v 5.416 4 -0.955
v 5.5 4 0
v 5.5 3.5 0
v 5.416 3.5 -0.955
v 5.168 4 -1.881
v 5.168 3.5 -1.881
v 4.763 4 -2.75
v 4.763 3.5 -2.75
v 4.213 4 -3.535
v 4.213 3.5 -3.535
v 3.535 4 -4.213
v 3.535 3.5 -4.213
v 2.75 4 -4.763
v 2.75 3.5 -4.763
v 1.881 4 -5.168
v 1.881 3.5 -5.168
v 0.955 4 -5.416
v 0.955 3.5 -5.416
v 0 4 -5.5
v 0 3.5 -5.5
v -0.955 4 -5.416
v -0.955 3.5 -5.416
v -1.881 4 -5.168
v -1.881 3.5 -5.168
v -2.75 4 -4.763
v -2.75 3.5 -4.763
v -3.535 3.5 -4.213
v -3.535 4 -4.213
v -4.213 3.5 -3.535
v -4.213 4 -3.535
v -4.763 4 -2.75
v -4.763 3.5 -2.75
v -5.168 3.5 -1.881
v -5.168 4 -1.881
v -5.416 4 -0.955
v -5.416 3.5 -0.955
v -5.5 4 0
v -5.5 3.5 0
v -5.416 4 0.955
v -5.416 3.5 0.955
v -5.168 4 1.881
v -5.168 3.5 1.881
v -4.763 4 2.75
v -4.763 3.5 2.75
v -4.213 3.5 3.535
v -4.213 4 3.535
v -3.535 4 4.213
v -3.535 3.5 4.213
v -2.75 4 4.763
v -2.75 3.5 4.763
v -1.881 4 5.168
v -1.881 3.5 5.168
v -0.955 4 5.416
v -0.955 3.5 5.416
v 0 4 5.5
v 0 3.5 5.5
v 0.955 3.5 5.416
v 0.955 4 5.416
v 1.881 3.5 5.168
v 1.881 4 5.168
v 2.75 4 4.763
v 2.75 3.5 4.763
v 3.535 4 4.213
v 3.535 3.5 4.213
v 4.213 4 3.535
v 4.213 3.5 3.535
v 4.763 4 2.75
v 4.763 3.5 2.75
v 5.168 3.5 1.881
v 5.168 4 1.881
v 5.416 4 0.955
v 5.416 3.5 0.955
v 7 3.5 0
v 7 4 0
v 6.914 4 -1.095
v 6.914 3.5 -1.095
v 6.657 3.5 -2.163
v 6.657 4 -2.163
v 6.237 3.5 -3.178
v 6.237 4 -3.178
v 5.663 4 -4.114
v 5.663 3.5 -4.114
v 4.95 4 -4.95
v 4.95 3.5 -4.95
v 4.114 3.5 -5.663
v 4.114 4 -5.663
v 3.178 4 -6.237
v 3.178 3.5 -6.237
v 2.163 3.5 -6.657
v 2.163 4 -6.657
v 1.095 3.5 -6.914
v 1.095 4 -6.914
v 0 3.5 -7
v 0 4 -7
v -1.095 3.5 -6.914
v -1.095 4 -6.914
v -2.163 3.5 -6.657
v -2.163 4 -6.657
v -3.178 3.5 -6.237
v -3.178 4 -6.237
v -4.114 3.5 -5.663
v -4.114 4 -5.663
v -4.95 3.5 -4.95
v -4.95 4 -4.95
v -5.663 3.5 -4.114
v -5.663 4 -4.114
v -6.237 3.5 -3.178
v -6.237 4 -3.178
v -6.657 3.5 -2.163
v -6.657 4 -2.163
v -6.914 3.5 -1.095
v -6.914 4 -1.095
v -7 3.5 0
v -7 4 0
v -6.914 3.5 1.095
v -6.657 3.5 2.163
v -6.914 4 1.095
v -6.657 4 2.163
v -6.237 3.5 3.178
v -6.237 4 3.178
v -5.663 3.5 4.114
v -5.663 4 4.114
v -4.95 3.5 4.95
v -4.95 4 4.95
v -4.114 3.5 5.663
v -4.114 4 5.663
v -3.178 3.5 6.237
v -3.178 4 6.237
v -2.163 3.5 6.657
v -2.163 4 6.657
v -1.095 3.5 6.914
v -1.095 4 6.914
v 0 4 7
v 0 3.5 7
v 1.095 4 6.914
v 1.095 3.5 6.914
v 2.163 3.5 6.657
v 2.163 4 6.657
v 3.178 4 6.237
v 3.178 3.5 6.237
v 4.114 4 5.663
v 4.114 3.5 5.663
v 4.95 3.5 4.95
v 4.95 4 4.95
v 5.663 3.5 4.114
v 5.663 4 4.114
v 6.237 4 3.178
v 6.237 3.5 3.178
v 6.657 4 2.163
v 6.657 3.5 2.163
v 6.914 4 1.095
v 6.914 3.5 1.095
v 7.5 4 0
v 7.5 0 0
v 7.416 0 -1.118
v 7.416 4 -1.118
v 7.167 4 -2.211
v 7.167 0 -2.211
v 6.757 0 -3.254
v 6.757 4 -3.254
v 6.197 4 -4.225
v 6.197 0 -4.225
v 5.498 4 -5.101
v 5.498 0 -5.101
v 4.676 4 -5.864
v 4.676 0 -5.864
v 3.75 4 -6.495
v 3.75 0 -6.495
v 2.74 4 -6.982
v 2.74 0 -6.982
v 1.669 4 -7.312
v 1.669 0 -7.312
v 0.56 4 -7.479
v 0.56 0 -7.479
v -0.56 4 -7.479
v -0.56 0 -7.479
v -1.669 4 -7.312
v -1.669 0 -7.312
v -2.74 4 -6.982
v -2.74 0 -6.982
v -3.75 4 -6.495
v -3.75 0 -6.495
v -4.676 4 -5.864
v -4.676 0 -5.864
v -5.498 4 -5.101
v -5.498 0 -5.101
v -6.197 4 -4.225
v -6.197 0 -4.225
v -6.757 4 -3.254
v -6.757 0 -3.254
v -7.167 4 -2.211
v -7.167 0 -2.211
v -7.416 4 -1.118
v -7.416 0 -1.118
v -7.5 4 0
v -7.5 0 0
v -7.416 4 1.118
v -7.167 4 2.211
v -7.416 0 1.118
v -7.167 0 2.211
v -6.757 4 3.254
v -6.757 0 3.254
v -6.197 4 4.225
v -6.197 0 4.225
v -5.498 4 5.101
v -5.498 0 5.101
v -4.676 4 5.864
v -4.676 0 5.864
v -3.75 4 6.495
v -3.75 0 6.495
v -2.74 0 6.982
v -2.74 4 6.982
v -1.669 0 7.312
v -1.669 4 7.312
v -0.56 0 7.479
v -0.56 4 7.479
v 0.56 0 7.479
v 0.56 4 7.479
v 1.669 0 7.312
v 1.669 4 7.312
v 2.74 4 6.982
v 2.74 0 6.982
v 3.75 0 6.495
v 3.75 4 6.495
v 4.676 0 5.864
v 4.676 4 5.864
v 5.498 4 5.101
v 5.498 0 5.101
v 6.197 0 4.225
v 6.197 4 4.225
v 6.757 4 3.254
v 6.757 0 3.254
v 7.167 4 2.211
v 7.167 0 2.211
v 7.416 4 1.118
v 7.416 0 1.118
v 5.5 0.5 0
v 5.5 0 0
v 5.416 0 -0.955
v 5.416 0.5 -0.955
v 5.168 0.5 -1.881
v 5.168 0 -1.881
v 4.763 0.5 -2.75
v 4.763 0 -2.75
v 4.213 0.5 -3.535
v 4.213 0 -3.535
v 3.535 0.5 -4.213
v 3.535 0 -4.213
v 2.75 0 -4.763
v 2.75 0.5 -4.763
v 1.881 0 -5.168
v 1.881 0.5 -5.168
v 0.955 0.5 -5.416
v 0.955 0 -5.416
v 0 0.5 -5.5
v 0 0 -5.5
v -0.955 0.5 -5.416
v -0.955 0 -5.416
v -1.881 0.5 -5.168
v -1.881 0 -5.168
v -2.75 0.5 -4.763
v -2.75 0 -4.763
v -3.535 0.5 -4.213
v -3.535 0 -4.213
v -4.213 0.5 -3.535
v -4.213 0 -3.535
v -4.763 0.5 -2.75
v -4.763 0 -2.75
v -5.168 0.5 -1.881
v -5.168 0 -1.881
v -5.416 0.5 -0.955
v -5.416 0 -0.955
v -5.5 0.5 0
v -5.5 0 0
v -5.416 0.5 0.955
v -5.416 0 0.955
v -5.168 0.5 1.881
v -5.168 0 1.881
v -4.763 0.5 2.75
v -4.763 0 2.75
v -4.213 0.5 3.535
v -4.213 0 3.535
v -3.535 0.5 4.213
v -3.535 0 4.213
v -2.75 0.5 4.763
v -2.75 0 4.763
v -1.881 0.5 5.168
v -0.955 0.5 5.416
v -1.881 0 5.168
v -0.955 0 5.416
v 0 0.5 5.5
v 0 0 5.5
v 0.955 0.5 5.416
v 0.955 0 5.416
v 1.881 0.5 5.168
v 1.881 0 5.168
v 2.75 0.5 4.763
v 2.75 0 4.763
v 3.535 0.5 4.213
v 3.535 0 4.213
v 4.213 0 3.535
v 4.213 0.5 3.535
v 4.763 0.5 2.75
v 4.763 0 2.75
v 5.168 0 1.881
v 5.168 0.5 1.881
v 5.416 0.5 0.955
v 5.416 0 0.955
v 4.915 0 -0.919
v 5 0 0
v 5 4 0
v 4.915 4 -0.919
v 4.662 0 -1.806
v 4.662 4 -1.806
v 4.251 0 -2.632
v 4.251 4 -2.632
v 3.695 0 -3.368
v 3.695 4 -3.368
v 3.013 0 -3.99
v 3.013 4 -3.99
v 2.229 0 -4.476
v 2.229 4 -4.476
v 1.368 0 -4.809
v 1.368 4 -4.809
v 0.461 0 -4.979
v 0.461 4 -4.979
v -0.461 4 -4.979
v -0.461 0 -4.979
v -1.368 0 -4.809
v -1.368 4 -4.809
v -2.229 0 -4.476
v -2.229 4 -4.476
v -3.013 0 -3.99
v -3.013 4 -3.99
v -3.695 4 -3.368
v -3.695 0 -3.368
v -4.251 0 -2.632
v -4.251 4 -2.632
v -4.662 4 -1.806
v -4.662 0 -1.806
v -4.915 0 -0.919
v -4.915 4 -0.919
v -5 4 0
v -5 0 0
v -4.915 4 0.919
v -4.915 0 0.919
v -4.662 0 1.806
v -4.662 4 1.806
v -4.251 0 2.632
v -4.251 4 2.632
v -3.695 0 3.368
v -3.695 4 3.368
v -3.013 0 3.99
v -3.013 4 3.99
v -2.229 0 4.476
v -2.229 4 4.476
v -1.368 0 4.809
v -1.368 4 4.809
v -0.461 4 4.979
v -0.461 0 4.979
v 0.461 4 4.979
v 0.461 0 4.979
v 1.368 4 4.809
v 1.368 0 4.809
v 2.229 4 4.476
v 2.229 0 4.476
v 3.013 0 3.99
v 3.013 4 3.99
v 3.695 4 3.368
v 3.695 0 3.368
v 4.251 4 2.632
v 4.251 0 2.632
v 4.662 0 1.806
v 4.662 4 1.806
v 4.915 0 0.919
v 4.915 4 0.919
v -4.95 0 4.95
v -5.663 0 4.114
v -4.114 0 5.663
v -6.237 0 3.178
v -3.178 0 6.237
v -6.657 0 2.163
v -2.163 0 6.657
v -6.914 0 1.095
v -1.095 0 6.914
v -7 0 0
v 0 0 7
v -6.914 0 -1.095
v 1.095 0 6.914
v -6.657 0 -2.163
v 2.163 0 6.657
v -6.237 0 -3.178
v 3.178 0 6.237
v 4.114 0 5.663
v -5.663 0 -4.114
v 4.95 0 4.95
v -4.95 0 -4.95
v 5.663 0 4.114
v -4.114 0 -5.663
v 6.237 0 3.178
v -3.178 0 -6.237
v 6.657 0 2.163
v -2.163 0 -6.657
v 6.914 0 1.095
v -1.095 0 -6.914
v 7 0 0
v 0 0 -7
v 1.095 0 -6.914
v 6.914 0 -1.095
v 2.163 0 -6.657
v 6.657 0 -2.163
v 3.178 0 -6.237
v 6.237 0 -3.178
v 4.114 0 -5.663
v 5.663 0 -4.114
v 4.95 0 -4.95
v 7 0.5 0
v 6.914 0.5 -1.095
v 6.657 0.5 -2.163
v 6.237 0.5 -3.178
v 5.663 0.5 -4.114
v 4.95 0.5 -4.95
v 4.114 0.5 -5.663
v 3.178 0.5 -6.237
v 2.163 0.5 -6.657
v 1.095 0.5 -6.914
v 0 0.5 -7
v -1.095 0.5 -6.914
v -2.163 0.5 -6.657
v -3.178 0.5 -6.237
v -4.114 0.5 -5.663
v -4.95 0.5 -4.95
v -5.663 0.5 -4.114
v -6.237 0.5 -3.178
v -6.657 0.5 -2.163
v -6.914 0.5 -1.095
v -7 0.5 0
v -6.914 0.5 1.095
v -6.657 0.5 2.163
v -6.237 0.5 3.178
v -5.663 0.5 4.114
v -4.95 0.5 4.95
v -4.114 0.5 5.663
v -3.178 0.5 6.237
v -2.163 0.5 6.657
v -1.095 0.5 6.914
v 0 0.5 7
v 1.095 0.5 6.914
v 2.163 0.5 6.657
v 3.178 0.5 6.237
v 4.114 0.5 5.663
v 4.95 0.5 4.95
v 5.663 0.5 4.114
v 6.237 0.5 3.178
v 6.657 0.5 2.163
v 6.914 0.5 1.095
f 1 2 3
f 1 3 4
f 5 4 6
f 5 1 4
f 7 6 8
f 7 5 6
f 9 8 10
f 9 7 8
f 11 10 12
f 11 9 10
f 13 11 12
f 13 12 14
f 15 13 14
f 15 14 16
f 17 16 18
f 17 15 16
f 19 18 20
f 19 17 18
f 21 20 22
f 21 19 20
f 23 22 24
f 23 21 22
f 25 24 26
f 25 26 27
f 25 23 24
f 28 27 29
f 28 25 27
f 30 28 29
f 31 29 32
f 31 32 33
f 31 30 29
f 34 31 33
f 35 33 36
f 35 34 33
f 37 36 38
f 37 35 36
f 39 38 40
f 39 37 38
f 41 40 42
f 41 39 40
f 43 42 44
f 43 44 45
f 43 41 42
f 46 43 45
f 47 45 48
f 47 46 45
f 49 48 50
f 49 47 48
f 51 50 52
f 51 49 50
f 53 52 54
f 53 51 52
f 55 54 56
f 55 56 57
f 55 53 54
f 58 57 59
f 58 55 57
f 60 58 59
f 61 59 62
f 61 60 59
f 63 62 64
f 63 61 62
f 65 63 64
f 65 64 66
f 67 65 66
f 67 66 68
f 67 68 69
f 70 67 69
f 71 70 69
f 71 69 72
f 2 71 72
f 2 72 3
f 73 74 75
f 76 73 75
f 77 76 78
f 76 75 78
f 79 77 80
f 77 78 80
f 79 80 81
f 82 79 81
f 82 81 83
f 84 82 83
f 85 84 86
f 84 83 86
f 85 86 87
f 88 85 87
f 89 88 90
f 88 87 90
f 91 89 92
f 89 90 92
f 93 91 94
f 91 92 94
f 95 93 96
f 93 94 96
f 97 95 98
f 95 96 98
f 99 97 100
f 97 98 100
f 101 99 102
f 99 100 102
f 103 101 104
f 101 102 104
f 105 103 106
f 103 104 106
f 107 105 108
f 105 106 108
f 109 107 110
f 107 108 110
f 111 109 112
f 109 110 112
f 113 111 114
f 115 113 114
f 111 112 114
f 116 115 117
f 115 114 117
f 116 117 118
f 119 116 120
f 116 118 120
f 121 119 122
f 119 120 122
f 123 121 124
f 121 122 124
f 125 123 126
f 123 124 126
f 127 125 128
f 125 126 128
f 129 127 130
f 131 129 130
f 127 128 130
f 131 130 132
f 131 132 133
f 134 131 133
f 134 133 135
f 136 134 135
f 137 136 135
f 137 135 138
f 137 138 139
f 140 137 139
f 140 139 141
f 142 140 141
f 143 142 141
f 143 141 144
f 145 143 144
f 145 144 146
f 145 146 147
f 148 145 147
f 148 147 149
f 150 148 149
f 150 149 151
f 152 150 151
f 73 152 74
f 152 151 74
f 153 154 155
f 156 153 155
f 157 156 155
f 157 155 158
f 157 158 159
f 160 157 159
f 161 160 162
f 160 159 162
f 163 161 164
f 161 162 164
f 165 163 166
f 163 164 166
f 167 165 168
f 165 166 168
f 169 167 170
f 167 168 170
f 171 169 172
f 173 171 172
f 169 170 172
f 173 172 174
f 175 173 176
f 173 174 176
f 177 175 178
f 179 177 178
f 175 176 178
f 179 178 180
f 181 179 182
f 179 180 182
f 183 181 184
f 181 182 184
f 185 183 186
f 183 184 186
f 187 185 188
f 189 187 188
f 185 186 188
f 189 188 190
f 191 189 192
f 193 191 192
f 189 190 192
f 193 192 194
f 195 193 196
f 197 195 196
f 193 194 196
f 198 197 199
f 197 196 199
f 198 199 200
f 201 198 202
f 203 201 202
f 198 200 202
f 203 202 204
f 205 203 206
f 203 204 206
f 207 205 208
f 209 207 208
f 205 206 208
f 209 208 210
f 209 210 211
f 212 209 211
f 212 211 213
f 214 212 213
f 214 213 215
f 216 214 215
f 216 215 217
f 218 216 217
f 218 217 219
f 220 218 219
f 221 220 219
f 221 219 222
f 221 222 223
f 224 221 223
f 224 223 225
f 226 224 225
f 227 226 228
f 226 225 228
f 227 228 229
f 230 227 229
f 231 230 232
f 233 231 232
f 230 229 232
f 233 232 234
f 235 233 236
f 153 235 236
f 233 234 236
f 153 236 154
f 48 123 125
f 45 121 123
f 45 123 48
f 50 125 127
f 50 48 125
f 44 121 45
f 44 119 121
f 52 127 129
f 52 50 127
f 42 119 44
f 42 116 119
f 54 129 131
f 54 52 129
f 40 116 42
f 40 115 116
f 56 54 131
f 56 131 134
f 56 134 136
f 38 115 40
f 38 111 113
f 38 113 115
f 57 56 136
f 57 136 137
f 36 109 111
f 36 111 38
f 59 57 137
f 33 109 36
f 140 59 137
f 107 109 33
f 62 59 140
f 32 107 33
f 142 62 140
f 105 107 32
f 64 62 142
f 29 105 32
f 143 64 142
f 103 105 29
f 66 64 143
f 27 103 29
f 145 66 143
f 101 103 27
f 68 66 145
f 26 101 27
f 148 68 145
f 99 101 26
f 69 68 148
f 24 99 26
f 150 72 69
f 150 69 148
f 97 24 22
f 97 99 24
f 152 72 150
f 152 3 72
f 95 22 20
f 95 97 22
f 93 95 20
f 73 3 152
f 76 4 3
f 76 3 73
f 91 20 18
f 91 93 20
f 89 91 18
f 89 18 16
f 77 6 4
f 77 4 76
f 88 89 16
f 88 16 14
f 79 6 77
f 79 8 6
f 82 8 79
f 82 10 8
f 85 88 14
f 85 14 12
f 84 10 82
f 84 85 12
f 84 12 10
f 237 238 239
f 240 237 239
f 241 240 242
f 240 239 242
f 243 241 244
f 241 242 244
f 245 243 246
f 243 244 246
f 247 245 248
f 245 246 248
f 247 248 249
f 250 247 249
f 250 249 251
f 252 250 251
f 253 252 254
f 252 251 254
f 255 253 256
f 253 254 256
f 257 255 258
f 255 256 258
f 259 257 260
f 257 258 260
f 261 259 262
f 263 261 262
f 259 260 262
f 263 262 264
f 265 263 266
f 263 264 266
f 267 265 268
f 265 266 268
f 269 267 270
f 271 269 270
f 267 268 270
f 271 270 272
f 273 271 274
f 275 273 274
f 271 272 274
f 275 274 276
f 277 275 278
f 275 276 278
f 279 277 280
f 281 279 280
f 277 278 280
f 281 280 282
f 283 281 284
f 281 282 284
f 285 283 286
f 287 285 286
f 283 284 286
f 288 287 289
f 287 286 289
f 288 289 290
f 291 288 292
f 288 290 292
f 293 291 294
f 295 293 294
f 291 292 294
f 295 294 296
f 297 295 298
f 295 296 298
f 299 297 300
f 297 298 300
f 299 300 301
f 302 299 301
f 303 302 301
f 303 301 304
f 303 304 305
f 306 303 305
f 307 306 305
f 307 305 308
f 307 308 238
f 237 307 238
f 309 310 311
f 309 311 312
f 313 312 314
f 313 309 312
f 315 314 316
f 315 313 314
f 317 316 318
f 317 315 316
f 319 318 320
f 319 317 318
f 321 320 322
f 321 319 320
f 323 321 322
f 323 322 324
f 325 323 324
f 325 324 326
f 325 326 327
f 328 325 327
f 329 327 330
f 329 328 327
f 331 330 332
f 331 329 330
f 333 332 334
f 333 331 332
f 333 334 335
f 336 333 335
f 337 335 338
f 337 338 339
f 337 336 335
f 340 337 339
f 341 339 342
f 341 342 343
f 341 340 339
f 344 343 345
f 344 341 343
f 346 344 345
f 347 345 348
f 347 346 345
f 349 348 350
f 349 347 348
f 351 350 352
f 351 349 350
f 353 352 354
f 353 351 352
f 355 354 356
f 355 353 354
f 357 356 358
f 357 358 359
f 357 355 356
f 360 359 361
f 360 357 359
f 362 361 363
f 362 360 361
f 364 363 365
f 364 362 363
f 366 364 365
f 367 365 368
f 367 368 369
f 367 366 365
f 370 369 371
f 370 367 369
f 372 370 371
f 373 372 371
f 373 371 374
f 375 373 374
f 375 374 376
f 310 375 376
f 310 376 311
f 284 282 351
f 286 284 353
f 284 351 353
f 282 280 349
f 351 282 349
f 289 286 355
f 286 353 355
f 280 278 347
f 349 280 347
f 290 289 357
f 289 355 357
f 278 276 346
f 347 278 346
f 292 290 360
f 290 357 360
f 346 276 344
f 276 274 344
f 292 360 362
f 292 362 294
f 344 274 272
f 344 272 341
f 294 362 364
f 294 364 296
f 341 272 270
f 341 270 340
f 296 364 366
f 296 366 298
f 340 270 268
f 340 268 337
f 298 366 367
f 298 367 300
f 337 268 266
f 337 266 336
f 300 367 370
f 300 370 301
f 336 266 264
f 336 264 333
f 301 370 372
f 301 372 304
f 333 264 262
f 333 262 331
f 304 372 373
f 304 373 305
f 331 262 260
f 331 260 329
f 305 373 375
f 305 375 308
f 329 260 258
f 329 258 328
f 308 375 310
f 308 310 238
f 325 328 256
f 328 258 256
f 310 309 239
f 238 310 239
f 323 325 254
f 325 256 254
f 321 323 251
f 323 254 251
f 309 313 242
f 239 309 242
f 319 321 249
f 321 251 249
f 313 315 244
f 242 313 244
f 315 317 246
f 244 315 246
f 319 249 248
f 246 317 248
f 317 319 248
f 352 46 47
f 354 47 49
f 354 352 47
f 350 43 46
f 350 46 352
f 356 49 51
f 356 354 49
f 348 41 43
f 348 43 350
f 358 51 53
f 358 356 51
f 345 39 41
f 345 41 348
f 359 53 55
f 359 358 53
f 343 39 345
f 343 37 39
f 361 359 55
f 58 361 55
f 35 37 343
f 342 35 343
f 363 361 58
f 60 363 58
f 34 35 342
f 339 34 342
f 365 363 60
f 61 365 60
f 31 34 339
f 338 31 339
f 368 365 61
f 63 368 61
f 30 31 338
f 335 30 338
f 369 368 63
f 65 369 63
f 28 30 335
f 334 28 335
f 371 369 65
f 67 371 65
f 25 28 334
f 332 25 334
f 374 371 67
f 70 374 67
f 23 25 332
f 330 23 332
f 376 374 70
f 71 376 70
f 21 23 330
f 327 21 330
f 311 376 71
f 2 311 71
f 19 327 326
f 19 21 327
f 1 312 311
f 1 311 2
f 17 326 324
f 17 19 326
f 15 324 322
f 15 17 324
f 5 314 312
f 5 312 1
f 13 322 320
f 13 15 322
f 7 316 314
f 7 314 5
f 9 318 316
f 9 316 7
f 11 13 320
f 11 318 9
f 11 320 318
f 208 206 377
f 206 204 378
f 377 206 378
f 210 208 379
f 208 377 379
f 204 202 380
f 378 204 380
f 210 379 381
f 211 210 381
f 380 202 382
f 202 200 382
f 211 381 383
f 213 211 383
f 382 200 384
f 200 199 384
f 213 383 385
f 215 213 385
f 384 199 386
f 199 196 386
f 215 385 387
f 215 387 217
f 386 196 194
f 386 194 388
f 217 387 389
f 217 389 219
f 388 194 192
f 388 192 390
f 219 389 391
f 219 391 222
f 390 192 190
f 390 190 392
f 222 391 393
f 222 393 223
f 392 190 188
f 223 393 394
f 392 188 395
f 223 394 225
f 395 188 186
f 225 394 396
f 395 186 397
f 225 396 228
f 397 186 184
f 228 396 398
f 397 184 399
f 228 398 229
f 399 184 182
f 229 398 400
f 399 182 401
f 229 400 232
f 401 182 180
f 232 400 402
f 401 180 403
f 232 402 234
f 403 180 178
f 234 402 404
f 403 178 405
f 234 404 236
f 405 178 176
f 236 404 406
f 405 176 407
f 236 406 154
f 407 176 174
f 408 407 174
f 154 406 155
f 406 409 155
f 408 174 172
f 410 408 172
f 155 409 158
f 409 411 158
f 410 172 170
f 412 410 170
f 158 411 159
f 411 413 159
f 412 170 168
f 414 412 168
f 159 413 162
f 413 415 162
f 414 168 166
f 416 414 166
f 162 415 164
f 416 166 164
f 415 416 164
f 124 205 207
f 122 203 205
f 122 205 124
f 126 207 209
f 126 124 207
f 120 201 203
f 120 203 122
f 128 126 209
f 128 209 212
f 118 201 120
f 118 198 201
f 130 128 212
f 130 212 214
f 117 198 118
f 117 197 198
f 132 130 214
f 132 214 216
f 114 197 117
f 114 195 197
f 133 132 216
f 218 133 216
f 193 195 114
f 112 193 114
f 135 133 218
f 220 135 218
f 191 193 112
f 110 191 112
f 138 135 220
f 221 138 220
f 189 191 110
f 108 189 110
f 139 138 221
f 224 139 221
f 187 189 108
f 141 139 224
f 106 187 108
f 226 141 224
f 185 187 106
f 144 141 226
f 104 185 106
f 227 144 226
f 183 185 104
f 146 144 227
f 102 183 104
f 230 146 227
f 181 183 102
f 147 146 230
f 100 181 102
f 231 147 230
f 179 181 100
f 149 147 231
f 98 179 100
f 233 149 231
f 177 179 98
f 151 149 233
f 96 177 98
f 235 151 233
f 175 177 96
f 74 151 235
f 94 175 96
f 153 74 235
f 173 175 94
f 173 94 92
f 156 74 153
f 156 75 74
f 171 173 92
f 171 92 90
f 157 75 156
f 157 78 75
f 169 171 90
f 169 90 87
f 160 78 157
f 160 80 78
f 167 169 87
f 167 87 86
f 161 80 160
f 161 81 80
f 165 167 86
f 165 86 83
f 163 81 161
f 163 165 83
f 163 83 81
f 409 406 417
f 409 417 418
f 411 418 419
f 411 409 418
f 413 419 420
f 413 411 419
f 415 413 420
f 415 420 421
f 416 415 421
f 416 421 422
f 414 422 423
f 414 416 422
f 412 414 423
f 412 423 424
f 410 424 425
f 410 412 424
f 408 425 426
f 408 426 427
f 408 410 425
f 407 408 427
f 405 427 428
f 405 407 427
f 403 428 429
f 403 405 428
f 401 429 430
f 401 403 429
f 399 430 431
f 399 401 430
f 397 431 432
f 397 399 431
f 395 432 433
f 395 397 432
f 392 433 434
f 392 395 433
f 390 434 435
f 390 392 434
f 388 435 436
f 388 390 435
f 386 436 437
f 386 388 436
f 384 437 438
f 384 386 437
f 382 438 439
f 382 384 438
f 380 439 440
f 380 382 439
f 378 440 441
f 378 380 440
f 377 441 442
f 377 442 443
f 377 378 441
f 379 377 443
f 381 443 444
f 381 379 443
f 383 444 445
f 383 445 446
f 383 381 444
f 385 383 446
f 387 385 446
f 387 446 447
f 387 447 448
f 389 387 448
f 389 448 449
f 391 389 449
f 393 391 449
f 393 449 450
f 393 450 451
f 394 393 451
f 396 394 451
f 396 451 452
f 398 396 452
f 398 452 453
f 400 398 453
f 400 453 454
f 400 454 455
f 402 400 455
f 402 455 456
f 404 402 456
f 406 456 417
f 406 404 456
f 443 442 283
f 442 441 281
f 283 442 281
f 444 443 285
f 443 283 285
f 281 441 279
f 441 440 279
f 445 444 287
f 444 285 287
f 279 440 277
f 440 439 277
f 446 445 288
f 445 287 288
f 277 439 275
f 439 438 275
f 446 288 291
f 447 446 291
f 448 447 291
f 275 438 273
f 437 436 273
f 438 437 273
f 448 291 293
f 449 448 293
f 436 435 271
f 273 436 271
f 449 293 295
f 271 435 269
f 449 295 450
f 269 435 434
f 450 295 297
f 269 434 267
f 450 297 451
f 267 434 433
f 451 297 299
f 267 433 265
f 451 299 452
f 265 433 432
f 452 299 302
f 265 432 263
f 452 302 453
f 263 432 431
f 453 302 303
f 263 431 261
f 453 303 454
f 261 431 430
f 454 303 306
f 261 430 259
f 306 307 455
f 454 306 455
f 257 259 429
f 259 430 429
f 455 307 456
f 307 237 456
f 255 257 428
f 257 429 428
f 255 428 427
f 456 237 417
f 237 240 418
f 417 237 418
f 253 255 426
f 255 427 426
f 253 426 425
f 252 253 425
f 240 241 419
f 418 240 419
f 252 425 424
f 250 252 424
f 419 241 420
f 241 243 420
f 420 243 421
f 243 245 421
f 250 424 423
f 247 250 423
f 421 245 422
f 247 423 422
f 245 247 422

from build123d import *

# Parameters (mm, degrees)
SKETCH1_R           = 7.5
SKETCH1_R_2         = 5
BOSS_EXTRUDE1_DEPTH = 4
SKETCH2_R           = 7
SKETCH2_R_2         = 5.5
CUT_EXTRUDE1_DEPTH  = 0.5


with BuildPart() as part:
    # Sketch1 → Boss-Extrude1 (new body)
    with BuildSketch(Plane(origin=(0, 0, 0), x_dir=(1, 0, 0), z_dir=(0, 1, 0))):
        Circle(SKETCH1_R)
        Circle(SKETCH1_R_2, mode=Mode.SUBTRACT)
    extrude(amount=BOSS_EXTRUDE1_DEPTH)

    # Sketch2 → Cut-Extrude1 (cut)
    with BuildSketch(Plane(origin=(0, 4, 0), x_dir=(1, 0, 0), z_dir=(0, 1, 0))):
        Circle(SKETCH2_R)
        Circle(SKETCH2_R_2, mode=Mode.SUBTRACT)
    cut_extrude1 = extrude(amount=-CUT_EXTRUDE1_DEPTH, mode=Mode.SUBTRACT)

    # Mirror1: Cut-Extrude1 across plane
    add(cut_extrude1.mirror(Plane(origin=(0, 2, 0), x_dir=(0, 0, 1), z_dir=(0, -1, 0))), mode=Mode.SUBTRACT)


solid = part.part
